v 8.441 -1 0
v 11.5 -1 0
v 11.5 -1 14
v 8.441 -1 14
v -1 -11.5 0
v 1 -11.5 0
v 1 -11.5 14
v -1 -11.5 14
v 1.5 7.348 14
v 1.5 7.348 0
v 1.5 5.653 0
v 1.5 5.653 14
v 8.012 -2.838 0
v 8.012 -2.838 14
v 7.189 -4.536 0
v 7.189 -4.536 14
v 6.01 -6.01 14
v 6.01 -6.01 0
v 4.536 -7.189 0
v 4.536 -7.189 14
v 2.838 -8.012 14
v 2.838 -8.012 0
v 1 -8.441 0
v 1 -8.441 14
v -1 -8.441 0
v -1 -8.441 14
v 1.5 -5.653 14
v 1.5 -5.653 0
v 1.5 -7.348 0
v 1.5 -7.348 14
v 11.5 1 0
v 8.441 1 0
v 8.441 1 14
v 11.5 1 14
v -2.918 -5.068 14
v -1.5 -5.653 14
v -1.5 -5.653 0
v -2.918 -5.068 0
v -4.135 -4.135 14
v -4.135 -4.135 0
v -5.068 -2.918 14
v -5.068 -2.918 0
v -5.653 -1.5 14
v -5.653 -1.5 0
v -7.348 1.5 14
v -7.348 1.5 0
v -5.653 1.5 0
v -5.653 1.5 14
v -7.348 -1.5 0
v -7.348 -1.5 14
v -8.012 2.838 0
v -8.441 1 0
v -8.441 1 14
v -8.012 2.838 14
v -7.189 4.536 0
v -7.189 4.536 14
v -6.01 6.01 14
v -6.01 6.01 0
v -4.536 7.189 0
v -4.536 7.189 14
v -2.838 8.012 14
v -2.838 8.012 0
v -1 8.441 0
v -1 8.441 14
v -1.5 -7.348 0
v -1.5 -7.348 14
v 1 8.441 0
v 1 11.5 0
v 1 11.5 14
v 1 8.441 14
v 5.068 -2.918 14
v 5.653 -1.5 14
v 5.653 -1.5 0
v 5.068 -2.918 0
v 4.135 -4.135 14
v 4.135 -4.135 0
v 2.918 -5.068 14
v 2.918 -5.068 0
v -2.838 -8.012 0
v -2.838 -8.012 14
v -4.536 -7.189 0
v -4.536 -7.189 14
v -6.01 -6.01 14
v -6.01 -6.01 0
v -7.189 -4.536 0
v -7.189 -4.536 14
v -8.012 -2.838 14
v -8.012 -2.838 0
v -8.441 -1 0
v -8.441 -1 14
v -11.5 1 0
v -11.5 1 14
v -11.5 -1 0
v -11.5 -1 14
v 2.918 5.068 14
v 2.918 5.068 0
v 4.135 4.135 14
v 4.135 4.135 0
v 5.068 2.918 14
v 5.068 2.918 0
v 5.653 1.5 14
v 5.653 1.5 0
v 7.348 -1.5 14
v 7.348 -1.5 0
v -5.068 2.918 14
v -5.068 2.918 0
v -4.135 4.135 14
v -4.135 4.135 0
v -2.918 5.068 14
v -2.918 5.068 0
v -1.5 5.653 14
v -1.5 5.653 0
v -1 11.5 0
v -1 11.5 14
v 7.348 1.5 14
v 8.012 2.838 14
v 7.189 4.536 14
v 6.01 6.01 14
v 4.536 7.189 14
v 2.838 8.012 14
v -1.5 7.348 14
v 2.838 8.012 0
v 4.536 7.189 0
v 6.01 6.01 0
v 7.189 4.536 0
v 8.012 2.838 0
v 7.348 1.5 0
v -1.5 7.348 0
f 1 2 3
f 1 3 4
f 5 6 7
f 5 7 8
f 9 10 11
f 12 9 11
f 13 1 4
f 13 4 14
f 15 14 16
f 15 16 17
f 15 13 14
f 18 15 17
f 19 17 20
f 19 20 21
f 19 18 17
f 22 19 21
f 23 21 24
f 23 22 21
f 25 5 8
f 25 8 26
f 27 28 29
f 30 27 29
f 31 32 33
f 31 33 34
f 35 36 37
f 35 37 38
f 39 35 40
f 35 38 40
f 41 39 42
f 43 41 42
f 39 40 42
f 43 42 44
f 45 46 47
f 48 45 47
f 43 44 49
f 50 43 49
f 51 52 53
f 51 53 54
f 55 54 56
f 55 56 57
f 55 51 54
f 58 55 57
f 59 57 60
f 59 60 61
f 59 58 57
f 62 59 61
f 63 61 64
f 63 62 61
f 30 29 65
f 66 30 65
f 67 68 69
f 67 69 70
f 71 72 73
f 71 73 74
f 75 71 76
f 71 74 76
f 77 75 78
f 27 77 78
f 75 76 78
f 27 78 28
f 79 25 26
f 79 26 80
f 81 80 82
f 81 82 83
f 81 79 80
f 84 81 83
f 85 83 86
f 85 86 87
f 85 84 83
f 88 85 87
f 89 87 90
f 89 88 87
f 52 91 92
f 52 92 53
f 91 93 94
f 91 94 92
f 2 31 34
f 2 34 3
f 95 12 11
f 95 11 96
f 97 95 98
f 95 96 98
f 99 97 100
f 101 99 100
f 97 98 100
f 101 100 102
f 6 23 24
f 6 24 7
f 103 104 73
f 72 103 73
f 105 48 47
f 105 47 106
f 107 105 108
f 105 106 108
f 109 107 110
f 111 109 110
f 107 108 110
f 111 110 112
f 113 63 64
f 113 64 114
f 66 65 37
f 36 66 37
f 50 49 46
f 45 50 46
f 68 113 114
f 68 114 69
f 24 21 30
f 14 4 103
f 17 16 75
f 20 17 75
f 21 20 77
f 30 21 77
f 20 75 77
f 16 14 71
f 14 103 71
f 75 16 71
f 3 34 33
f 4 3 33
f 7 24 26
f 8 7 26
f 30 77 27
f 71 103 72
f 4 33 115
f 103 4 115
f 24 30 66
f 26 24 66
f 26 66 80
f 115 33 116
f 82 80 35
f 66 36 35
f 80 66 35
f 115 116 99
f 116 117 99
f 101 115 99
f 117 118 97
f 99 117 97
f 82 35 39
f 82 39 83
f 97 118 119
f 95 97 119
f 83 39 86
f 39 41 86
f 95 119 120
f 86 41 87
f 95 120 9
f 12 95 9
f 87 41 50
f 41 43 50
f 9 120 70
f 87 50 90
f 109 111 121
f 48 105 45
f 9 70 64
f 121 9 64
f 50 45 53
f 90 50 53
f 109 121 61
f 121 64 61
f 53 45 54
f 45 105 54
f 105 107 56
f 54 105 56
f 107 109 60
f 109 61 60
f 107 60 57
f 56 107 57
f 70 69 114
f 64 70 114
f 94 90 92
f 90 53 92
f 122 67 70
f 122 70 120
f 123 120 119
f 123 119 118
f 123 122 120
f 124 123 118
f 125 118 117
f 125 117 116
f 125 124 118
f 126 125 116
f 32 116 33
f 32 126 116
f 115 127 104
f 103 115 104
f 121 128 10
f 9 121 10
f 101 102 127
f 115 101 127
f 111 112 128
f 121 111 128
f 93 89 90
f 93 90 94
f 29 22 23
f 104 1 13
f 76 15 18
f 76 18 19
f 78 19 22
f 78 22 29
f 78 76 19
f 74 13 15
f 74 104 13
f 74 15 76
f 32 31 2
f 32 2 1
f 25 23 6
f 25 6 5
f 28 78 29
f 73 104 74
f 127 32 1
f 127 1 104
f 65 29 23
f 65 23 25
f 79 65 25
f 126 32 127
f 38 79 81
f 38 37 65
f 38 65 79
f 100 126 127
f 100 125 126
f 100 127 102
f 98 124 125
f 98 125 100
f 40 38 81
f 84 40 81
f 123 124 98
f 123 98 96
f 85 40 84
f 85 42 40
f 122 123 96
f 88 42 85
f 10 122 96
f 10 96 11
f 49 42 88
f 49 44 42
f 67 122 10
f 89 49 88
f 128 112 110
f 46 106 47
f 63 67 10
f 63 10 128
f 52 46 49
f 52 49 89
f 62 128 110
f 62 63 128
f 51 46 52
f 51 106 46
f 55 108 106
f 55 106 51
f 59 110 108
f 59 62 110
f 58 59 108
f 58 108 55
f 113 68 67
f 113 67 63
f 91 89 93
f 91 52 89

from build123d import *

# Parameters (mm, degrees)
BOSS_EXTRUDE1_DEPTH = 14


with BuildPart() as part:
    # Sketch1 → Boss-Extrude1 (new body)
    with BuildSketch(Plane.XY):
        with BuildLine():
            Line((-1, 8.440971508), (-1, 11.5))
            Line((-1, 11.5), (1, 11.5))
            Line((1, 11.5), (1, 8.440971508))
            ThreePointArc((1, 8.440971508), (6.01040764, 6.01040764), (8.440971508, 1))
            Line((8.440971508, 1), (11.5, 1))
            Line((11.5, 1), (11.5, -1))
            Line((11.5, -1), (8.440971508, -1))
            ThreePointArc((8.440971508, -1), (6.01040764, -6.01040764), (1, -8.440971508))
            Line((1, -8.440971508), (1, -11.5))
            Line((1, -11.5), (-1, -11.5))
            Line((-1, -11.5), (-1, -8.440971508))
            ThreePointArc((-1, -8.440971508), (-6.01040764, -6.01040764), (-8.440971508, -1))
            Line((-8.440971508, -1), (-11.5, -1))
            Line((-11.5, -1), (-11.5, 1))
            Line((-11.5, 1), (-8.440971508, 1))
            ThreePointArc((-8.440971508, 1), (-6.01040764, 6.01040764), (-1, 8.440971508))
        make_face()
        with BuildLine():
            Line((-1.5, 5.652839314), (-1.5, 7.348469228))
            Line((-1.5, 7.348469228), (1.5, 7.348469228))
            Line((1.5, 7.348469228), (1.5, 5.652839314))
            ThreePointArc((1.5, 5.652839314), (4.135492251, 4.135492251), (5.652839314, 1.5))
            Line((5.652839314, 1.5), (7.348469228, 1.5))
            Line((7.348469228, 1.5), (7.348469228, -1.5))
            Line((7.348469228, -1.5), (5.652839314, -1.5))
            ThreePointArc((5.652839314, -1.5), (4.135492251, -4.135492251), (1.5, -5.652839314))
            Line((1.5, -5.652839314), (1.5, -7.348469228))
            Line((1.5, -7.348469228), (-1.5, -7.348469228))
            Line((-1.5, -7.348469228), (-1.5, -5.652839314))
            ThreePointArc((-1.5, -5.652839314), (-4.135492251, -4.135492251), (-5.652839314, -1.5))
            Line((-5.652839314, -1.5), (-7.348469228, -1.5))
            Line((-7.348469228, -1.5), (-7.348469228, 1.5))
            Line((-7.348469228, 1.5), (-5.652839314, 1.5))
            ThreePointArc((-5.652839314, 1.5), (-4.135492251, 4.135492251), (-1.5, 5.652839314))
        make_face(mode=Mode.SUBTRACT)
    extrude(amount=BOSS_EXTRUDE1_DEPTH)


solid = part.part
